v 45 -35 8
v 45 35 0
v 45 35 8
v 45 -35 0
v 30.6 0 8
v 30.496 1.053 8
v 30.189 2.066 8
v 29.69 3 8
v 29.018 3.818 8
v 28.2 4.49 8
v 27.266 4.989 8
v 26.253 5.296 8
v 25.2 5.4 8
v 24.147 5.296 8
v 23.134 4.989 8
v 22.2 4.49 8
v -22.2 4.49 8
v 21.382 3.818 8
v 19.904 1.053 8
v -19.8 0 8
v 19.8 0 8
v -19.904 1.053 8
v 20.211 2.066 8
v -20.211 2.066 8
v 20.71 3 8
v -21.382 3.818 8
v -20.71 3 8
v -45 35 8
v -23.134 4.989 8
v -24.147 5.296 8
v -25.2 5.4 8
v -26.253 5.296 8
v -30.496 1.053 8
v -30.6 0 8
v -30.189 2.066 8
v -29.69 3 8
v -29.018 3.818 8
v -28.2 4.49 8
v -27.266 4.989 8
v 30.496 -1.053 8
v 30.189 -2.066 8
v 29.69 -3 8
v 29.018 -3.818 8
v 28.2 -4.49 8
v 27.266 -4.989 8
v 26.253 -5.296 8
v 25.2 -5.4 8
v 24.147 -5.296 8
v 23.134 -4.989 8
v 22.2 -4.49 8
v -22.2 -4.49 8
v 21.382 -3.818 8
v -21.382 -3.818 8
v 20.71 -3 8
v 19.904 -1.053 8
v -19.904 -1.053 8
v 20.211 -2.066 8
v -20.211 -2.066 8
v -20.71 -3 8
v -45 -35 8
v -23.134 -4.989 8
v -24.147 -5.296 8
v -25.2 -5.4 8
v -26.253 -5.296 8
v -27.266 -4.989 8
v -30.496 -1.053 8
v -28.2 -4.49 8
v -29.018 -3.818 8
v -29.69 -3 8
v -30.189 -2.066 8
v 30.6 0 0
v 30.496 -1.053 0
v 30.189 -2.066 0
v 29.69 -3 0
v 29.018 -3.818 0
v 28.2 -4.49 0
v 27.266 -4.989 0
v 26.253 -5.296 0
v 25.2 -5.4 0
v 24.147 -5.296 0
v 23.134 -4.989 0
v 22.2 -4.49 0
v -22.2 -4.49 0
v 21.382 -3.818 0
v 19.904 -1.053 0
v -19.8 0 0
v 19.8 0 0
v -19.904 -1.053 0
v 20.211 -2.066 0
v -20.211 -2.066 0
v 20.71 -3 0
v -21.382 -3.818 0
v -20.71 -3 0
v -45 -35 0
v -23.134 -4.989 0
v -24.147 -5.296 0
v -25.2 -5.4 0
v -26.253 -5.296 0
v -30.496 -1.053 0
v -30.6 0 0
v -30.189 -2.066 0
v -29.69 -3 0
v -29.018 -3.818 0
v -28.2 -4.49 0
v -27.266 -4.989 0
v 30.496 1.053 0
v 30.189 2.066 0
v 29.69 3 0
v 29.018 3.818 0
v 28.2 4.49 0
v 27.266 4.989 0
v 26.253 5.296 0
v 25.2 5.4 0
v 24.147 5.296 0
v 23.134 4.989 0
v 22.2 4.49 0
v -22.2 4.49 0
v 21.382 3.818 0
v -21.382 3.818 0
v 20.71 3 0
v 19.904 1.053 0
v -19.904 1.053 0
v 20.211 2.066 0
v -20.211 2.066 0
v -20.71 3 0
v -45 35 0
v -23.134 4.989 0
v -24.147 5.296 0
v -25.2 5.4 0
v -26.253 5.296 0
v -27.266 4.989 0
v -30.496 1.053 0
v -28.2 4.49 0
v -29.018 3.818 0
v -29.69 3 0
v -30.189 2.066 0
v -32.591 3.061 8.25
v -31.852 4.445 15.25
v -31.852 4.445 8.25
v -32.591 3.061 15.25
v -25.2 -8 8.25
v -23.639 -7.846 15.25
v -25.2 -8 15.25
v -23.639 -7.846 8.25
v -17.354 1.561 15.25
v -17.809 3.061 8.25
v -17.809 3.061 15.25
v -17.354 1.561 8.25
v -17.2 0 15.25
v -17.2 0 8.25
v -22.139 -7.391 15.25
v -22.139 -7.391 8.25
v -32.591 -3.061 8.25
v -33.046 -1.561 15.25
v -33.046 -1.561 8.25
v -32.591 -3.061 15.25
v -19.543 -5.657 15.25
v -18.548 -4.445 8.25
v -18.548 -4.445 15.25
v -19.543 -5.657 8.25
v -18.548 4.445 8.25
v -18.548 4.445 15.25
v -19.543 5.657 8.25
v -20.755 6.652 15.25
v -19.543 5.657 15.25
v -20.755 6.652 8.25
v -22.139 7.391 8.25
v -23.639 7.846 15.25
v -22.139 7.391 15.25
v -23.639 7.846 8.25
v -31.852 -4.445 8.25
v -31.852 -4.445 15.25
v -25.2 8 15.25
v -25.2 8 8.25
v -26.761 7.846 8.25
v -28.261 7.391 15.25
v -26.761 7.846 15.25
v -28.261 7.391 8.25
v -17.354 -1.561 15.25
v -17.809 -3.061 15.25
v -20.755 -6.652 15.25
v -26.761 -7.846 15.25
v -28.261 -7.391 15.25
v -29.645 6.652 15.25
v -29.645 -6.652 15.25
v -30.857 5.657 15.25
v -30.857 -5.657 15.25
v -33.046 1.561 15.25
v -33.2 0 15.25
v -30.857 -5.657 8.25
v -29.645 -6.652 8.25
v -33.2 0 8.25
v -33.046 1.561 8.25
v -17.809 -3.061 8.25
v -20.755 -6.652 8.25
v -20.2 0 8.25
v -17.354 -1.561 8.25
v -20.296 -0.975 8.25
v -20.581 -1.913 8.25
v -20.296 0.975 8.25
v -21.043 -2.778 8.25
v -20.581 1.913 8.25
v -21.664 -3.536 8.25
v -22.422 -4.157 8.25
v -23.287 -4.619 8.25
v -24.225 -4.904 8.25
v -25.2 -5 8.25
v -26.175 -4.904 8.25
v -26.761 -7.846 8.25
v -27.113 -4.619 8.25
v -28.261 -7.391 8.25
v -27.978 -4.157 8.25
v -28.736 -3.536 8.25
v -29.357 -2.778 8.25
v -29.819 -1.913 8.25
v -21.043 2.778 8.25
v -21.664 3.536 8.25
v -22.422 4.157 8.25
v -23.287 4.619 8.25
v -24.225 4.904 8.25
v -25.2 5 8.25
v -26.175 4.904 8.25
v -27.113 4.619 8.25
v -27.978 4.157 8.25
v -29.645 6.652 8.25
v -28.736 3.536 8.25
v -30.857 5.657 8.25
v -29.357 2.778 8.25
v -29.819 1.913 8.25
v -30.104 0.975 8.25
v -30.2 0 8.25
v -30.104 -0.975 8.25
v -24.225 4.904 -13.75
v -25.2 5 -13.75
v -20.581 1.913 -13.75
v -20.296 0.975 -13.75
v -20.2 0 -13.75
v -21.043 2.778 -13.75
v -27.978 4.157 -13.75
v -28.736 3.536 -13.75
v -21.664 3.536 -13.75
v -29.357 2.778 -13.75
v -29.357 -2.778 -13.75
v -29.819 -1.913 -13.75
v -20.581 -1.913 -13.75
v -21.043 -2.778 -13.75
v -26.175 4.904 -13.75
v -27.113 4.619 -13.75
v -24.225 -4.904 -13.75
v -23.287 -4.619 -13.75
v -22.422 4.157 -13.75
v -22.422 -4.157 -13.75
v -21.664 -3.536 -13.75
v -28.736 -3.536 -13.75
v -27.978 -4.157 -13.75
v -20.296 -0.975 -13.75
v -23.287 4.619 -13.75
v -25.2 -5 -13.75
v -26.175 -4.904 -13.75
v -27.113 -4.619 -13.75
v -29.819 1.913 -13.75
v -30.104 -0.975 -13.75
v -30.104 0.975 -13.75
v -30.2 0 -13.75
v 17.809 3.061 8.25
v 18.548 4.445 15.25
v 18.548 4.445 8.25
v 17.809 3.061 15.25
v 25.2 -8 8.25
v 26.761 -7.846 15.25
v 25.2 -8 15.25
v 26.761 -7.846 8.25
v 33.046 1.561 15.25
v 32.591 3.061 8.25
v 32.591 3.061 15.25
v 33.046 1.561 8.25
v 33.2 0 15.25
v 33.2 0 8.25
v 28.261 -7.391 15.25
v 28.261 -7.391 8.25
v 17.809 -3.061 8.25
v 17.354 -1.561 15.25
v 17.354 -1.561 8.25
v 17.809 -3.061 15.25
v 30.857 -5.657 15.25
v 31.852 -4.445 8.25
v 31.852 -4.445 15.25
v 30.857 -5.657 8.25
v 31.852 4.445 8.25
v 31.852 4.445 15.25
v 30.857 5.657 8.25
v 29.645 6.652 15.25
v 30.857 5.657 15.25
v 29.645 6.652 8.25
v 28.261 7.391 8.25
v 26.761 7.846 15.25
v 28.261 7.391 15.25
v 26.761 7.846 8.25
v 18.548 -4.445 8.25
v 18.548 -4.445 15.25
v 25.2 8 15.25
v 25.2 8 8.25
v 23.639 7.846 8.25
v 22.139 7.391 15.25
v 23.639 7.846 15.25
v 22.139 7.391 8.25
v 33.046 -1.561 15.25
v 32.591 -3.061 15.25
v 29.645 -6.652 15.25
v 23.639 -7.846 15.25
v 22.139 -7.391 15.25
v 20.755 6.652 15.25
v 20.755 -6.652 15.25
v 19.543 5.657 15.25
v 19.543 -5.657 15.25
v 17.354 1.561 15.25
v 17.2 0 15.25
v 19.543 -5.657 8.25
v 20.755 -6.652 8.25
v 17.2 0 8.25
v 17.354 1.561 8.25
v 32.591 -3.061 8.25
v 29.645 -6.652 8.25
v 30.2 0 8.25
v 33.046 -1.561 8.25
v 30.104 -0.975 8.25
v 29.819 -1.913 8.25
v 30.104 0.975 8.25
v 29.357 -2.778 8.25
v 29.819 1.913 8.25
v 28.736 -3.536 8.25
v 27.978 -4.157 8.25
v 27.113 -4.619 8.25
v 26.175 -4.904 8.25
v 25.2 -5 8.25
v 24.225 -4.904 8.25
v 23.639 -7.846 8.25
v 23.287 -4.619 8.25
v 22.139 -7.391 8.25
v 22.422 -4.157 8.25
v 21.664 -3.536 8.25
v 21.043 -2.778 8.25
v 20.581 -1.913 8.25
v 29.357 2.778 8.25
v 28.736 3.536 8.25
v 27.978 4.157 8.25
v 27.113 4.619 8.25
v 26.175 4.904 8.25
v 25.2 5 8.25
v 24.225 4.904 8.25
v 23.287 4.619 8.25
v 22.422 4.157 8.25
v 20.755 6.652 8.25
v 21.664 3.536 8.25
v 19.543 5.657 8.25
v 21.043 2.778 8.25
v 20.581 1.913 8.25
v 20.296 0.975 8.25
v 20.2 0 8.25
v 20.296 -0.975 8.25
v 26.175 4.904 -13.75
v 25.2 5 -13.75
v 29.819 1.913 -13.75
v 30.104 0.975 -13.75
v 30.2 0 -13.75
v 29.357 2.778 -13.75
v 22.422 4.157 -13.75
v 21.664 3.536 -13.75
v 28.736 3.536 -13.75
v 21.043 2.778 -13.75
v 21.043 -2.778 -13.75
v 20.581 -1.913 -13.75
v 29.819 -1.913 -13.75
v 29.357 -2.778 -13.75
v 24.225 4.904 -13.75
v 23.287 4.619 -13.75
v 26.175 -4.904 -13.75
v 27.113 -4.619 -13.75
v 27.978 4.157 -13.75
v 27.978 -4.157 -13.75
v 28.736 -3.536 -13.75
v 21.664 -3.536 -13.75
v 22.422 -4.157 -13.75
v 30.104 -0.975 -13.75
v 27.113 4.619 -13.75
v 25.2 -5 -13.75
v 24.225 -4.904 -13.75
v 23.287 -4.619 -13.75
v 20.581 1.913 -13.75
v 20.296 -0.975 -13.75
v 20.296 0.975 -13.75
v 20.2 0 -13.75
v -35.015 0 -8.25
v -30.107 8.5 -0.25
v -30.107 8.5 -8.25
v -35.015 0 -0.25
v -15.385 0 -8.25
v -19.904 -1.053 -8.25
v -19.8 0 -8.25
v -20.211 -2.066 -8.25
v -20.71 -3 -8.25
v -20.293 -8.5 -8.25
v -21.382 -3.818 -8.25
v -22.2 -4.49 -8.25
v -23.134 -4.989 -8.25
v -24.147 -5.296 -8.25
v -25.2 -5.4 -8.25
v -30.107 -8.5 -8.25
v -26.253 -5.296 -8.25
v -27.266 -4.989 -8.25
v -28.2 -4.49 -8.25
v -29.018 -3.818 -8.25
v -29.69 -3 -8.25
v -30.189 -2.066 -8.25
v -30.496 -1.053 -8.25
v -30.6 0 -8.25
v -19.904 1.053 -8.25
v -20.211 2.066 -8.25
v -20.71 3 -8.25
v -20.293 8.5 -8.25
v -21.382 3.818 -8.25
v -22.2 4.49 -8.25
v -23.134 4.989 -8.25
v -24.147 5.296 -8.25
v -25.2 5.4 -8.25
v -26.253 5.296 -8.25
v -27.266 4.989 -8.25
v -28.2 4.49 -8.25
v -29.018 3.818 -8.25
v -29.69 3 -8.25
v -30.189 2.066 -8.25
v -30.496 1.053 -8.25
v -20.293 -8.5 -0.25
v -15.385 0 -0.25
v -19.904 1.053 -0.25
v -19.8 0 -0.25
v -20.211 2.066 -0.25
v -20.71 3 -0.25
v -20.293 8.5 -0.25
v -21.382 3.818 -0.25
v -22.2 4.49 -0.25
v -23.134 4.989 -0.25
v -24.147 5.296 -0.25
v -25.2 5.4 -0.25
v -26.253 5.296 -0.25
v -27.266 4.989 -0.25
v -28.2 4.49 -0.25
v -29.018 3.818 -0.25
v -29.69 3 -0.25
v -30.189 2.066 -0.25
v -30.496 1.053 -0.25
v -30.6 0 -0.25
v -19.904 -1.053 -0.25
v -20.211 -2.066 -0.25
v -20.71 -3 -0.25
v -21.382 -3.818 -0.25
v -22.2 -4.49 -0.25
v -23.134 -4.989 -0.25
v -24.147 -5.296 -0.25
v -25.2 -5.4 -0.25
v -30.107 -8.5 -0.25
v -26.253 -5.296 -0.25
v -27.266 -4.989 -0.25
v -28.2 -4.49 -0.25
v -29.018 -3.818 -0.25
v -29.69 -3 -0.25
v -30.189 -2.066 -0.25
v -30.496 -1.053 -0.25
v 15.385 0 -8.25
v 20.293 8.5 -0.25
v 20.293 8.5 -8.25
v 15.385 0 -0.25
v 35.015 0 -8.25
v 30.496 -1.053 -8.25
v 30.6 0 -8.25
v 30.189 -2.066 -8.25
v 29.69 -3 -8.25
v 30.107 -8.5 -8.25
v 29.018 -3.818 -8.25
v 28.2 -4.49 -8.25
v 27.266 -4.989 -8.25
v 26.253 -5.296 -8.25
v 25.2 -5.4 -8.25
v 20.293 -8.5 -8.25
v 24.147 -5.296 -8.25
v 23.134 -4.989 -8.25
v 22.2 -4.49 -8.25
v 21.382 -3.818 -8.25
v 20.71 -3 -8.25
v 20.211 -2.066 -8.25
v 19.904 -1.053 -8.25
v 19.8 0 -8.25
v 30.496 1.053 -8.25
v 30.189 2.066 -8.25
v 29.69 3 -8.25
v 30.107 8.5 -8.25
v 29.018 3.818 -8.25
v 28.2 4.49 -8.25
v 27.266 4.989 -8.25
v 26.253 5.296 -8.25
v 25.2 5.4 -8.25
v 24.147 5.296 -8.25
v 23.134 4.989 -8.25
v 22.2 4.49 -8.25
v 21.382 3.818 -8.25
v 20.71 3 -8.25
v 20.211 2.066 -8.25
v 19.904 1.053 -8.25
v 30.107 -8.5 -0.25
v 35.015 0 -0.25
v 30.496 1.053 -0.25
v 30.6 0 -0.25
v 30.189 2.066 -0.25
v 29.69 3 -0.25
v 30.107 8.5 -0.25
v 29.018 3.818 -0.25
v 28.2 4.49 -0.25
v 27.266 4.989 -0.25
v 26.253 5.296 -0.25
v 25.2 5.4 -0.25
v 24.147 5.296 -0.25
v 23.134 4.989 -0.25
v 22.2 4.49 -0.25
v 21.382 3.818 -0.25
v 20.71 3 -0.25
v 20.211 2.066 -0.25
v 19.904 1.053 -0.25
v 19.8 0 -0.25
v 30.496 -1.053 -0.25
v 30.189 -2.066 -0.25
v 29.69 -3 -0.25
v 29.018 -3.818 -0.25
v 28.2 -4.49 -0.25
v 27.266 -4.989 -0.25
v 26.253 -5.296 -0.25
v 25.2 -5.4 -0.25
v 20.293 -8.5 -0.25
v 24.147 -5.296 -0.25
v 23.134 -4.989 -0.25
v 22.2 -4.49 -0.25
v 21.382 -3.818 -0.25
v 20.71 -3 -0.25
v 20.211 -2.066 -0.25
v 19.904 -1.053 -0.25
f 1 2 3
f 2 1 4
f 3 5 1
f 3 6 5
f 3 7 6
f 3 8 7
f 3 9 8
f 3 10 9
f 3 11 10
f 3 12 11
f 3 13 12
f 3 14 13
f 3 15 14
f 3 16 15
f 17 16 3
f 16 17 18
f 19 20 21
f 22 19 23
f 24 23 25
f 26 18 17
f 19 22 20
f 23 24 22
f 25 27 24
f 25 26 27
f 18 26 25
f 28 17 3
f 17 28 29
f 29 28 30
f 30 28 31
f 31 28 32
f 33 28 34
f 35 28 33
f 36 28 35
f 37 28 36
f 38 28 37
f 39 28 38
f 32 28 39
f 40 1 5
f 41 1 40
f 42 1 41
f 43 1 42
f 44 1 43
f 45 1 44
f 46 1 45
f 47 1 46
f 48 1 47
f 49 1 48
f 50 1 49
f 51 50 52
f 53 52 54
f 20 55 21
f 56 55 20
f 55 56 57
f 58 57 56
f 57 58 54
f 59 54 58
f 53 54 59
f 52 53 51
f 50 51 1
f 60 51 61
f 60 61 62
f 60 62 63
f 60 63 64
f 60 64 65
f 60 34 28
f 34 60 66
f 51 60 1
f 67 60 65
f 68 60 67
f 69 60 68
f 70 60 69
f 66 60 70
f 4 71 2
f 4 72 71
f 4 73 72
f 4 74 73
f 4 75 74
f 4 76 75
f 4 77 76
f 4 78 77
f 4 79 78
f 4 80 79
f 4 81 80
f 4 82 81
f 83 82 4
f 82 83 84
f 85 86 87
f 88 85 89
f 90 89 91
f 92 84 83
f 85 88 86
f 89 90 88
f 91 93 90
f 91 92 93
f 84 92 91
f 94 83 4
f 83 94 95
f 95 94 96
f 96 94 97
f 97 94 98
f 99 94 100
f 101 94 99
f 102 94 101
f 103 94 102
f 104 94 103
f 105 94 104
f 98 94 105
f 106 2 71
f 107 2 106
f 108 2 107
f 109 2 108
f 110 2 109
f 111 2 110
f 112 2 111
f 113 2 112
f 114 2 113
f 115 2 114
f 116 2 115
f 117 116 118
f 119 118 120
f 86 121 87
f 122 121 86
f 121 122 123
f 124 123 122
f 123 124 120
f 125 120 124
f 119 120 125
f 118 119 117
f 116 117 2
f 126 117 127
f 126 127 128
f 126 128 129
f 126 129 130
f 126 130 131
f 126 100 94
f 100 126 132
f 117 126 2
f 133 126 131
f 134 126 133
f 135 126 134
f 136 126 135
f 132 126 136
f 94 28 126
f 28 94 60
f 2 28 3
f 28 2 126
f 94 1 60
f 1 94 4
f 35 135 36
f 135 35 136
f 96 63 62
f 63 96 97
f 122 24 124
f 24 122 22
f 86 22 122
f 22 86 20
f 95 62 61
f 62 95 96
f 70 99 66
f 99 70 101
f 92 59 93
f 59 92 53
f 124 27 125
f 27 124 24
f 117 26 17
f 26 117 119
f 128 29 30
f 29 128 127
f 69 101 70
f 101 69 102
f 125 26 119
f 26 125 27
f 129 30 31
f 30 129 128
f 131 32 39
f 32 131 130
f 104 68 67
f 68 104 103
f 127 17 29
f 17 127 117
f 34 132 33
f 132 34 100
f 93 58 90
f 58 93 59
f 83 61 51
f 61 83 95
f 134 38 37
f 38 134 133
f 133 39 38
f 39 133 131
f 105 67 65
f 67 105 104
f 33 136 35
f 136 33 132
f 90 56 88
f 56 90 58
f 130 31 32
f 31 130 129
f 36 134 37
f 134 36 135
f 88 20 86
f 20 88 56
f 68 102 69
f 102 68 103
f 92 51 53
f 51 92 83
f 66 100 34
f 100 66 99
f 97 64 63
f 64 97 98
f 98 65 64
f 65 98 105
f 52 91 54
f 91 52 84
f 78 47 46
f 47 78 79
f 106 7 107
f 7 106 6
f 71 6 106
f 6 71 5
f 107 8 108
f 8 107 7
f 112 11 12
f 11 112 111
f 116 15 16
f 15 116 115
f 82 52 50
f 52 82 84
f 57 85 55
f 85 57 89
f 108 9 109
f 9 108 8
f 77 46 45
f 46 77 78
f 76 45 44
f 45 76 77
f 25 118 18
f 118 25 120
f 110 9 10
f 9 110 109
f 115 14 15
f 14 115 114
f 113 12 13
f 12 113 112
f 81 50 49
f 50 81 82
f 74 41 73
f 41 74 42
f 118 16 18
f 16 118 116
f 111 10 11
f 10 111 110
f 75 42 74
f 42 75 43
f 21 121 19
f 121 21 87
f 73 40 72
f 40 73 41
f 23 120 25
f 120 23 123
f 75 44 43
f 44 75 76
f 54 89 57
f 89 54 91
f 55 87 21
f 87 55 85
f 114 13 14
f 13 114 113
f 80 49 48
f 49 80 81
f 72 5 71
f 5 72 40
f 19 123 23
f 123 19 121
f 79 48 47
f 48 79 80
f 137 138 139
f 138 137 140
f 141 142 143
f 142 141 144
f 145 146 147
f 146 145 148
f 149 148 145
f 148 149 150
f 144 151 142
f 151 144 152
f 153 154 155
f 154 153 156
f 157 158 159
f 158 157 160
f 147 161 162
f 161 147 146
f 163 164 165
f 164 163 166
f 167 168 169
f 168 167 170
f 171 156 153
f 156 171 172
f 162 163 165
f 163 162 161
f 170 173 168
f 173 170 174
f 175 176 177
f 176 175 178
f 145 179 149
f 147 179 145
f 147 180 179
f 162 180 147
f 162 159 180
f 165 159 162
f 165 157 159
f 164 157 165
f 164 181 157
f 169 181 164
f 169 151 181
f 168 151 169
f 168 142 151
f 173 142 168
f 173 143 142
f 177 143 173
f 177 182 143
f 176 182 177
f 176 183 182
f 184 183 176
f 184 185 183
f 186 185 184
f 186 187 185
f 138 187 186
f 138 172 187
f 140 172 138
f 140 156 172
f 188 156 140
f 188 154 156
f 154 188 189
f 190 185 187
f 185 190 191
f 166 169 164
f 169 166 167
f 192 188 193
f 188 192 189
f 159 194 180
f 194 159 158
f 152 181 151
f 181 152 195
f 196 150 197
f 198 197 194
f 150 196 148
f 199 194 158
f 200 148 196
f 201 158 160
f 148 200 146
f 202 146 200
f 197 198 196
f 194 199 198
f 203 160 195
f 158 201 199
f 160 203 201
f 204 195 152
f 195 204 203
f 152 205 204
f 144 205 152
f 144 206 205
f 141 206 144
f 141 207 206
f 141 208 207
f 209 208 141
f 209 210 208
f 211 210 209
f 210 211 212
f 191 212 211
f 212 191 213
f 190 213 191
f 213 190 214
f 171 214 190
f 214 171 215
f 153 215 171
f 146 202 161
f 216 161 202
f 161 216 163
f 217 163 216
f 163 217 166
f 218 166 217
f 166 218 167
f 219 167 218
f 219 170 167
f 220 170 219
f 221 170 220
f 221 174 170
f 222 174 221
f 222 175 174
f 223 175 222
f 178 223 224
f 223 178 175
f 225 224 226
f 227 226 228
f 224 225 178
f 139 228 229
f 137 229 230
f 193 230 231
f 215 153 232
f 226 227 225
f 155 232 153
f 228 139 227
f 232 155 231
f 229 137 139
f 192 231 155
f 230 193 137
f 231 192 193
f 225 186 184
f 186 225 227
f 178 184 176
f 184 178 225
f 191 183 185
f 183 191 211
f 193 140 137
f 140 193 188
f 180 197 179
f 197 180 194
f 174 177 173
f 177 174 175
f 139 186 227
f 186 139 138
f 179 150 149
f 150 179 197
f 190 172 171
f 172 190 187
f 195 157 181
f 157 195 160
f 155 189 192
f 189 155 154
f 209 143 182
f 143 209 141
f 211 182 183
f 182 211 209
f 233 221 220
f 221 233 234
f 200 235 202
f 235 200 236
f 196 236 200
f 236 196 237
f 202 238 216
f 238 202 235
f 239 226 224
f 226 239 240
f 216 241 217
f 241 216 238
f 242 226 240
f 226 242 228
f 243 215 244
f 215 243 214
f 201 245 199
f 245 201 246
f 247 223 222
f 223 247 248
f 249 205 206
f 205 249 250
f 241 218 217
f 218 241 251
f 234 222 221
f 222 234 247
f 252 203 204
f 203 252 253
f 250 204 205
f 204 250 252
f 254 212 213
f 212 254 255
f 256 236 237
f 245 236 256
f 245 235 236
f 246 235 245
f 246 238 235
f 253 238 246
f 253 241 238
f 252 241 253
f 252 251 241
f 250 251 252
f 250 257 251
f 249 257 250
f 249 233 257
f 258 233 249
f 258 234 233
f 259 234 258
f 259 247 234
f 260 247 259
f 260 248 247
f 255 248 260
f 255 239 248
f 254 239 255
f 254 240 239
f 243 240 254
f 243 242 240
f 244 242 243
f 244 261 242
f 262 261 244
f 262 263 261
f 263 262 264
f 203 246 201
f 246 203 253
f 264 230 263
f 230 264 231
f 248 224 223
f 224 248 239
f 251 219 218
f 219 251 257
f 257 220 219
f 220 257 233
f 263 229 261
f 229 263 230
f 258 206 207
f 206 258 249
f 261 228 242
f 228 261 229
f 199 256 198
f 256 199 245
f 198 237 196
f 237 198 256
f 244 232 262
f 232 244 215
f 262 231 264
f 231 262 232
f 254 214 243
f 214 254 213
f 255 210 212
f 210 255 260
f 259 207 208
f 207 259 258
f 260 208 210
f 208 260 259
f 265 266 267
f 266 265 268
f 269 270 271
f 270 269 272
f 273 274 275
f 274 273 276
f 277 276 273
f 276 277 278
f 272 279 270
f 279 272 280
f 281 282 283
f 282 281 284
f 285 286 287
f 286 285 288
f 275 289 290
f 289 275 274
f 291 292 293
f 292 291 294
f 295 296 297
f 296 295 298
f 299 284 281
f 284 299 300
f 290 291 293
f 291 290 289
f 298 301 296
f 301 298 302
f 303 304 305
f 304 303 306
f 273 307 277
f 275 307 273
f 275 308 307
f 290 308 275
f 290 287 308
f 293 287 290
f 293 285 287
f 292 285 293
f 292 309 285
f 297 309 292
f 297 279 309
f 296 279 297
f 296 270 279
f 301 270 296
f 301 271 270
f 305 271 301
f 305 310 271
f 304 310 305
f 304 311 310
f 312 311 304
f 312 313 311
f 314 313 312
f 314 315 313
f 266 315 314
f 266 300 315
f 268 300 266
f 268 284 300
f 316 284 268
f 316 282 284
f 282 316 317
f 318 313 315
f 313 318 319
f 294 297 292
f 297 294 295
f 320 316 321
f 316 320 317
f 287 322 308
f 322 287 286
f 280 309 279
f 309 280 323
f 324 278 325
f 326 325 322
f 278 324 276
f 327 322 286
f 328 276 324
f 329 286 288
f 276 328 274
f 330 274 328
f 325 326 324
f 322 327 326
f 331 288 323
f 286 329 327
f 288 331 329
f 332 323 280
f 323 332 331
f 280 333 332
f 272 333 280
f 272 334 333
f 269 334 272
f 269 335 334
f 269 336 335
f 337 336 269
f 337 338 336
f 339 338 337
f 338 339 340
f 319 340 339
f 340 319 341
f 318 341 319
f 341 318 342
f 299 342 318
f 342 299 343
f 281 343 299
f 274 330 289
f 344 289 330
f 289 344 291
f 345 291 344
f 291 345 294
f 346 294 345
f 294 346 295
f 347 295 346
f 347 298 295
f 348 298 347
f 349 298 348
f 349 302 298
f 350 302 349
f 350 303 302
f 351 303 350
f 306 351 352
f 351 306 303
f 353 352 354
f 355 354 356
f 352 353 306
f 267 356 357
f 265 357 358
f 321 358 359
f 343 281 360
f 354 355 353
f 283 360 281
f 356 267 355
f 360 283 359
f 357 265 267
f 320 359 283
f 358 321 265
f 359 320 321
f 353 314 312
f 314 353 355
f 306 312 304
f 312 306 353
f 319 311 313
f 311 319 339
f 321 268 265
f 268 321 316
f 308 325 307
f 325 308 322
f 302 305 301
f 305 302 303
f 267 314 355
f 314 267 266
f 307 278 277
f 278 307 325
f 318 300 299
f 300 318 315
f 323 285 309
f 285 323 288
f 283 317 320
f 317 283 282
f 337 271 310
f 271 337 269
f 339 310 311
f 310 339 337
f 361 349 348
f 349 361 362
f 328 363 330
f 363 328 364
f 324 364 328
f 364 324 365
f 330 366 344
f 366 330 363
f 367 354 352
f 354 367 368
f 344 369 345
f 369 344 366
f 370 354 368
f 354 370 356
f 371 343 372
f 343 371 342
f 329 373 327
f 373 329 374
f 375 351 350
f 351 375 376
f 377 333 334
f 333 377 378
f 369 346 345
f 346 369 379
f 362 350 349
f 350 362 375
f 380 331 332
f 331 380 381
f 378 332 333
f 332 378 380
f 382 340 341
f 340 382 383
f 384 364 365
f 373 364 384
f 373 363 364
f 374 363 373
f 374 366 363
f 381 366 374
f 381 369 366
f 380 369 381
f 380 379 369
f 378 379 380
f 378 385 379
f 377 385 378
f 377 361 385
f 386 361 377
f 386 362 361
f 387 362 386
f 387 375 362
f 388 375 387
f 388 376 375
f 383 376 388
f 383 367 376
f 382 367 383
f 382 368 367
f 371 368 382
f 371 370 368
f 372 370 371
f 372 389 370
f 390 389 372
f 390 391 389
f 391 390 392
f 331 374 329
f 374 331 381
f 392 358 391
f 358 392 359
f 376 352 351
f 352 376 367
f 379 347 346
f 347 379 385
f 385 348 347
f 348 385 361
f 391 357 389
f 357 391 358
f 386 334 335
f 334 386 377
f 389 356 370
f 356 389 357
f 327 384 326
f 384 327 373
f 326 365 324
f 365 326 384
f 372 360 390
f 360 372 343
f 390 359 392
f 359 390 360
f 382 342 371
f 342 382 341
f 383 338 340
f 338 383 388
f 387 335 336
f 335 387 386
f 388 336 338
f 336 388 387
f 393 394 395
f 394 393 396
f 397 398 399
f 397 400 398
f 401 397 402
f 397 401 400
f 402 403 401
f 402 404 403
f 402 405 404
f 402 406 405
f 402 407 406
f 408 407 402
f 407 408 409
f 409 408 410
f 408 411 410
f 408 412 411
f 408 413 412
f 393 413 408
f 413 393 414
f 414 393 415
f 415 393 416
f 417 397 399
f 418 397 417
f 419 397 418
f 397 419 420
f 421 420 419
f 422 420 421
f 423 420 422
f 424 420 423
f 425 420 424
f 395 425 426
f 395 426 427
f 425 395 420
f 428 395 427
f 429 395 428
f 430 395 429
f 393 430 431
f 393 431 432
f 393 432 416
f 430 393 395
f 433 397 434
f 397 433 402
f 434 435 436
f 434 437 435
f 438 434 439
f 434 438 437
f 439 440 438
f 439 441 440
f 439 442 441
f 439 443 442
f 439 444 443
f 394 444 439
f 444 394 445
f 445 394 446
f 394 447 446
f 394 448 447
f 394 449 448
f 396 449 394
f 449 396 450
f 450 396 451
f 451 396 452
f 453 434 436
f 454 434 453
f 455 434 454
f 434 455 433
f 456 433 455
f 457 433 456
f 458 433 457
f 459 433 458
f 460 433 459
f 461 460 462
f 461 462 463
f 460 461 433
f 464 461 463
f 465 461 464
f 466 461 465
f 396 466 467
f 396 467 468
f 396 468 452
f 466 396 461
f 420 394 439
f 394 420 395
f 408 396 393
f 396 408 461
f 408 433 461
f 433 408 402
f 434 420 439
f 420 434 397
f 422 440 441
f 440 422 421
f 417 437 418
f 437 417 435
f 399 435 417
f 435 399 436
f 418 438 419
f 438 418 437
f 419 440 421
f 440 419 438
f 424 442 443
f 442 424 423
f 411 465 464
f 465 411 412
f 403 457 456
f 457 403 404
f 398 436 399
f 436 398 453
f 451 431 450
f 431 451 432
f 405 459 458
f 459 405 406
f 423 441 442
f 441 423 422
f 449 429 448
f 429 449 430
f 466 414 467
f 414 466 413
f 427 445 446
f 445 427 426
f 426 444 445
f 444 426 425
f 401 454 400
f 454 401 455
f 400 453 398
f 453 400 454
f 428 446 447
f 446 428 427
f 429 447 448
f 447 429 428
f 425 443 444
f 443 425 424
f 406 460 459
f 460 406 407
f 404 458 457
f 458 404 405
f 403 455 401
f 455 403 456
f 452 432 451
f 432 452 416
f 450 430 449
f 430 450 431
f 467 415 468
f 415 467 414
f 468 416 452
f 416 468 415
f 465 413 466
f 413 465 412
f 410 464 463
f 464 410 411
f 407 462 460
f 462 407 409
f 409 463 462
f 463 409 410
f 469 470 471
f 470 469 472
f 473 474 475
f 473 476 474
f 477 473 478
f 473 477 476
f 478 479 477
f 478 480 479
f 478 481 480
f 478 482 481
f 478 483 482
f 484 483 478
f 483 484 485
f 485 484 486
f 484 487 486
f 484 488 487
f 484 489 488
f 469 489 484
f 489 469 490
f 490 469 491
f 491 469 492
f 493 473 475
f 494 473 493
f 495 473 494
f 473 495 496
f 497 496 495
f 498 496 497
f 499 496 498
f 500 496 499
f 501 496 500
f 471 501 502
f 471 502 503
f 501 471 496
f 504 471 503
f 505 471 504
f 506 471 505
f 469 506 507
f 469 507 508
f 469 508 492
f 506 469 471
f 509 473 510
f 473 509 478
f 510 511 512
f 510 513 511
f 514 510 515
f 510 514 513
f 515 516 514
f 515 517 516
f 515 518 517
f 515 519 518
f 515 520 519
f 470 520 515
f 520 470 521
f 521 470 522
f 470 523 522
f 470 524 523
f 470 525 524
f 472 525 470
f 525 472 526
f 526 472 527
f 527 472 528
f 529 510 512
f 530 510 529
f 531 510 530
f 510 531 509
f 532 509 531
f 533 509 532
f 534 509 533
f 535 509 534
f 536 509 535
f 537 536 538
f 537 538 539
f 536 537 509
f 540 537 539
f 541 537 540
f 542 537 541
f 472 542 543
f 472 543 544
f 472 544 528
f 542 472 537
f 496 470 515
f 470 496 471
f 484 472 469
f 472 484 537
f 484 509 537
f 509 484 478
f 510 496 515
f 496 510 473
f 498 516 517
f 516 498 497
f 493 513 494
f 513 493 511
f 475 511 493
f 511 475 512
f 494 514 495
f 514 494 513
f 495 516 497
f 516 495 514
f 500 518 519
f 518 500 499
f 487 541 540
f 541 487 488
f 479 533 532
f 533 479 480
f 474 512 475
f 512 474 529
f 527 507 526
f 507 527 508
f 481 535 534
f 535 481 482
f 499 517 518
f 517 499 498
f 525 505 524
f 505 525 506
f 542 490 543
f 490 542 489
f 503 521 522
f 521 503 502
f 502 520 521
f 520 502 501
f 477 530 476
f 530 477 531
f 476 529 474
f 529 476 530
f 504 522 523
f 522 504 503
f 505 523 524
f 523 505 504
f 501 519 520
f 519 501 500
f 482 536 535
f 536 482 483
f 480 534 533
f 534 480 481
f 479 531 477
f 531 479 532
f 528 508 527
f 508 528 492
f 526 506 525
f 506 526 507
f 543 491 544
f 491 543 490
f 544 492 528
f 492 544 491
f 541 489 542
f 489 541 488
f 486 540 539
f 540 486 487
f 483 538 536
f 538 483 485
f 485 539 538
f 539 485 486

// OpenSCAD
$fn = 32;

// ------------------------------------------------------------------------
// Bolted plate: 90 x 70 x 8 mm plate, 2 fasteners
// Every part is its own module, assembly() places them once.
// ------------------------------------------------------------------------

// --- part 1 ---
module plate() {
  difference() {
    translate([-45, -35, 0]) cube([90, 70, 8]);
    translate([-25.2, 0, -1]) cylinder(h = 10, d = 10.8);
    translate([25.2, 0, -1]) cylinder(h = 10, d = 10.8);
  }
}

// --- part 2 ---
module bolt1() {
  cylinder(h = 7, d = 16);
  translate([0, 0, -22]) cylinder(h = 22, d = 10);
}

// --- part 3 ---
module bolt2() {
  cylinder(h = 7, d = 16);
  translate([0, 0, -22]) cylinder(h = 22, d = 10);
}

// --- part 4 ---
module nut1() {
  difference() {
    linear_extrude(height = 8) polygon(points = [[9.815, 0], [4.907, 8.5], [-4.907, 8.5], [-9.815, 0], [-4.907, -8.5], [4.907, -8.5]]);
    translate([0, 0, -1]) cylinder(h = 10, d = 10.8);
  }
}

// --- part 5 ---
module nut2() {
  difference() {
    linear_extrude(height = 8) polygon(points = [[9.815, 0], [4.907, 8.5], [-4.907, 8.5], [-9.815, 0], [-4.907, -8.5], [4.907, -8.5]]);
    translate([0, 0, -1]) cylinder(h = 10, d = 10.8);
  }
}

// --- assembly ---
module assembly() {
  translate([0, 0, 0]) rotate([0, 0, 0]) plate();
  translate([-25.2, 0, 8.25]) rotate([0, 0, 0]) bolt1();
  translate([25.2, 0, 8.25]) rotate([0, 0, 0]) bolt2();
  translate([-25.2, 0, -8.25]) rotate([0, 0, 0]) nut1();
  translate([25.2, 0, -8.25]) rotate([0, 0, 0]) nut2();
}

assembly();
